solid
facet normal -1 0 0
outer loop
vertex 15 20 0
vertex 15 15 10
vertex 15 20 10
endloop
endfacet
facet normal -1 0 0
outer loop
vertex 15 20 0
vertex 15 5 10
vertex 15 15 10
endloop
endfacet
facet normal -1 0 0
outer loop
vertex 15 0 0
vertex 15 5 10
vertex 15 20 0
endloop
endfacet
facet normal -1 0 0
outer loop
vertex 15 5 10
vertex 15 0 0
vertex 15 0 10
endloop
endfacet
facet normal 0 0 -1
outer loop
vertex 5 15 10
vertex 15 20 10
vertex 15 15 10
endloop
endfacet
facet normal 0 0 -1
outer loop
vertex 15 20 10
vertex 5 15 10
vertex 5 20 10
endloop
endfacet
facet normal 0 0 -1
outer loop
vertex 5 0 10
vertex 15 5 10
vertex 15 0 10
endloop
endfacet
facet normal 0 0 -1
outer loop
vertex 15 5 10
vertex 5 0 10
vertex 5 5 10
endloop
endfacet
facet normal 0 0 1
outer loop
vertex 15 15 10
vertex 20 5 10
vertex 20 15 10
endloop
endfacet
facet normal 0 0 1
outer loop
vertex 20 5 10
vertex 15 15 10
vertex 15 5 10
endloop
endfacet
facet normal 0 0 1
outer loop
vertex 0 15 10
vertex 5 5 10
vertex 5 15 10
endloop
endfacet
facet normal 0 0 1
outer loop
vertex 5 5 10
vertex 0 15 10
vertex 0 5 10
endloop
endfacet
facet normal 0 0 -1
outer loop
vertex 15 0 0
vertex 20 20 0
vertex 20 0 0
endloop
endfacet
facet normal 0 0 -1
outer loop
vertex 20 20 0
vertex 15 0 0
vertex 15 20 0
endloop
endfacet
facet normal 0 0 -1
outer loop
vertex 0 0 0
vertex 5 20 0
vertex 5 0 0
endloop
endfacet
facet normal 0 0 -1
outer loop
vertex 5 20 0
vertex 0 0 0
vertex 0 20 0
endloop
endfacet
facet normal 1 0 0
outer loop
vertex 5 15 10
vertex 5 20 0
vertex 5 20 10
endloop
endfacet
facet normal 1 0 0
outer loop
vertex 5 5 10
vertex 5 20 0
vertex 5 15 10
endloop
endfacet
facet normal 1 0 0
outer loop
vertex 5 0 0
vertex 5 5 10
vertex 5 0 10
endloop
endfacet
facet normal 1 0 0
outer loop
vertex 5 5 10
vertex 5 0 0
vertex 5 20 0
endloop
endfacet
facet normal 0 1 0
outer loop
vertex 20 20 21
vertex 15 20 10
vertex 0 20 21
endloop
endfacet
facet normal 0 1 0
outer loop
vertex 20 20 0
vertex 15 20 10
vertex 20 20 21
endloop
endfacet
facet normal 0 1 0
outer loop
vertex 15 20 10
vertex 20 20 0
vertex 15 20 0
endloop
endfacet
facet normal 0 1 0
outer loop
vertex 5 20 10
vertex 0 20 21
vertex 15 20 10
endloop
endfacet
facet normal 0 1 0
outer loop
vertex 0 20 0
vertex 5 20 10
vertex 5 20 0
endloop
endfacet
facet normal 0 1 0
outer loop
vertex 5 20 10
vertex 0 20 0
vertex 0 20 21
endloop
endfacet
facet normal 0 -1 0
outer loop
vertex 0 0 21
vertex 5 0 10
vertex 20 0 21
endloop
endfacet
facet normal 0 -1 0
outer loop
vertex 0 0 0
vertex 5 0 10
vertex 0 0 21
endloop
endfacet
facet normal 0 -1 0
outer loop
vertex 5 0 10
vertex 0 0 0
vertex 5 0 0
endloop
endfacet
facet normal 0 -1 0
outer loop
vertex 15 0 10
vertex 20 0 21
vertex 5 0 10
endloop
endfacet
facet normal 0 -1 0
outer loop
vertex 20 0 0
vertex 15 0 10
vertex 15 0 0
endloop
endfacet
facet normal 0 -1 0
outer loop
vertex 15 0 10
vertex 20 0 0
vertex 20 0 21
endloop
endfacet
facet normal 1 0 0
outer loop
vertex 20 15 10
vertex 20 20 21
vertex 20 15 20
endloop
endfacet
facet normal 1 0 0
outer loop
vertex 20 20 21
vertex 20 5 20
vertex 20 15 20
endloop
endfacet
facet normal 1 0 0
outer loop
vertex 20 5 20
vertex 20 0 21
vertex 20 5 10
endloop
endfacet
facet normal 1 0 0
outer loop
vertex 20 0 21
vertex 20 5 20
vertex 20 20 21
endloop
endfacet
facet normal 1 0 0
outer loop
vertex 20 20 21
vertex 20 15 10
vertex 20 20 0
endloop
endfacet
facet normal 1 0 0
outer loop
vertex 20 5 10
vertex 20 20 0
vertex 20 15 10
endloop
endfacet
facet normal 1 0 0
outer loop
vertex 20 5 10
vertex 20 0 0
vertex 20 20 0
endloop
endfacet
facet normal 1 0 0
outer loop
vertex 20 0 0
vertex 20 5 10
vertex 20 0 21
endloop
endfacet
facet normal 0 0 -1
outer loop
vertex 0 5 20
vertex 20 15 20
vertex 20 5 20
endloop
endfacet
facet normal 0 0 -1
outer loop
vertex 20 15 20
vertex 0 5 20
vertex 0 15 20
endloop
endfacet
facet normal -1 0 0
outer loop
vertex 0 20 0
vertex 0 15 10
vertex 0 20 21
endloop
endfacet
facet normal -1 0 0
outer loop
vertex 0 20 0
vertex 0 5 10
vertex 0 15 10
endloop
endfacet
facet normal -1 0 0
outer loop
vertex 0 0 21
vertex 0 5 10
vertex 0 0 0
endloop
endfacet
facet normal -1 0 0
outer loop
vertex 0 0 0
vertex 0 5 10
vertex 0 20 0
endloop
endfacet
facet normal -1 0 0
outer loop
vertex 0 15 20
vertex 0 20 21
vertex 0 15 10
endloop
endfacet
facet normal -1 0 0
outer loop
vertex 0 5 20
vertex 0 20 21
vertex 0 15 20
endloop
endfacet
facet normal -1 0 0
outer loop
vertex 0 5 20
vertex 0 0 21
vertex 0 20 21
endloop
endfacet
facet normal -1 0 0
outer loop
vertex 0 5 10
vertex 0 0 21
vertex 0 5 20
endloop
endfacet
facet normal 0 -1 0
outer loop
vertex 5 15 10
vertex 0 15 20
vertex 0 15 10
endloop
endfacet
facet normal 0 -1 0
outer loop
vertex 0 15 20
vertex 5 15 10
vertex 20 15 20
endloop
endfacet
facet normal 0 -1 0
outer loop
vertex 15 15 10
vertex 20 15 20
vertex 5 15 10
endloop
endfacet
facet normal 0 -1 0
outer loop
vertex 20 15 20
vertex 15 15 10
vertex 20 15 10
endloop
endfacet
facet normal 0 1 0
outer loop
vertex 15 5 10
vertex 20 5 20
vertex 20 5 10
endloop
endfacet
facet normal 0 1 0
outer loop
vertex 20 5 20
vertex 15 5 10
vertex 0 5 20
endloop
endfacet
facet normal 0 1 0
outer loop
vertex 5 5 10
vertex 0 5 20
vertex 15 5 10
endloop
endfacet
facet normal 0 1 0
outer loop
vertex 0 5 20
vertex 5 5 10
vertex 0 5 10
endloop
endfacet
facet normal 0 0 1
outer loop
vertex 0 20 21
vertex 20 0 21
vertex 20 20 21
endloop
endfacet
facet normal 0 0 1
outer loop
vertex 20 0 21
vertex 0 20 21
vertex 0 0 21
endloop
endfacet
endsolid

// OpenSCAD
part1();
//part2();


module part1() {
    difference() {
        cube([20, 20, 21]);

        part2();
    }
}

module part2() {
    translate([5, 0, 0])
    cube([10, 20, 10]);

    translate([0, 5, 10])
    cube([20, 10, 10]);
}
